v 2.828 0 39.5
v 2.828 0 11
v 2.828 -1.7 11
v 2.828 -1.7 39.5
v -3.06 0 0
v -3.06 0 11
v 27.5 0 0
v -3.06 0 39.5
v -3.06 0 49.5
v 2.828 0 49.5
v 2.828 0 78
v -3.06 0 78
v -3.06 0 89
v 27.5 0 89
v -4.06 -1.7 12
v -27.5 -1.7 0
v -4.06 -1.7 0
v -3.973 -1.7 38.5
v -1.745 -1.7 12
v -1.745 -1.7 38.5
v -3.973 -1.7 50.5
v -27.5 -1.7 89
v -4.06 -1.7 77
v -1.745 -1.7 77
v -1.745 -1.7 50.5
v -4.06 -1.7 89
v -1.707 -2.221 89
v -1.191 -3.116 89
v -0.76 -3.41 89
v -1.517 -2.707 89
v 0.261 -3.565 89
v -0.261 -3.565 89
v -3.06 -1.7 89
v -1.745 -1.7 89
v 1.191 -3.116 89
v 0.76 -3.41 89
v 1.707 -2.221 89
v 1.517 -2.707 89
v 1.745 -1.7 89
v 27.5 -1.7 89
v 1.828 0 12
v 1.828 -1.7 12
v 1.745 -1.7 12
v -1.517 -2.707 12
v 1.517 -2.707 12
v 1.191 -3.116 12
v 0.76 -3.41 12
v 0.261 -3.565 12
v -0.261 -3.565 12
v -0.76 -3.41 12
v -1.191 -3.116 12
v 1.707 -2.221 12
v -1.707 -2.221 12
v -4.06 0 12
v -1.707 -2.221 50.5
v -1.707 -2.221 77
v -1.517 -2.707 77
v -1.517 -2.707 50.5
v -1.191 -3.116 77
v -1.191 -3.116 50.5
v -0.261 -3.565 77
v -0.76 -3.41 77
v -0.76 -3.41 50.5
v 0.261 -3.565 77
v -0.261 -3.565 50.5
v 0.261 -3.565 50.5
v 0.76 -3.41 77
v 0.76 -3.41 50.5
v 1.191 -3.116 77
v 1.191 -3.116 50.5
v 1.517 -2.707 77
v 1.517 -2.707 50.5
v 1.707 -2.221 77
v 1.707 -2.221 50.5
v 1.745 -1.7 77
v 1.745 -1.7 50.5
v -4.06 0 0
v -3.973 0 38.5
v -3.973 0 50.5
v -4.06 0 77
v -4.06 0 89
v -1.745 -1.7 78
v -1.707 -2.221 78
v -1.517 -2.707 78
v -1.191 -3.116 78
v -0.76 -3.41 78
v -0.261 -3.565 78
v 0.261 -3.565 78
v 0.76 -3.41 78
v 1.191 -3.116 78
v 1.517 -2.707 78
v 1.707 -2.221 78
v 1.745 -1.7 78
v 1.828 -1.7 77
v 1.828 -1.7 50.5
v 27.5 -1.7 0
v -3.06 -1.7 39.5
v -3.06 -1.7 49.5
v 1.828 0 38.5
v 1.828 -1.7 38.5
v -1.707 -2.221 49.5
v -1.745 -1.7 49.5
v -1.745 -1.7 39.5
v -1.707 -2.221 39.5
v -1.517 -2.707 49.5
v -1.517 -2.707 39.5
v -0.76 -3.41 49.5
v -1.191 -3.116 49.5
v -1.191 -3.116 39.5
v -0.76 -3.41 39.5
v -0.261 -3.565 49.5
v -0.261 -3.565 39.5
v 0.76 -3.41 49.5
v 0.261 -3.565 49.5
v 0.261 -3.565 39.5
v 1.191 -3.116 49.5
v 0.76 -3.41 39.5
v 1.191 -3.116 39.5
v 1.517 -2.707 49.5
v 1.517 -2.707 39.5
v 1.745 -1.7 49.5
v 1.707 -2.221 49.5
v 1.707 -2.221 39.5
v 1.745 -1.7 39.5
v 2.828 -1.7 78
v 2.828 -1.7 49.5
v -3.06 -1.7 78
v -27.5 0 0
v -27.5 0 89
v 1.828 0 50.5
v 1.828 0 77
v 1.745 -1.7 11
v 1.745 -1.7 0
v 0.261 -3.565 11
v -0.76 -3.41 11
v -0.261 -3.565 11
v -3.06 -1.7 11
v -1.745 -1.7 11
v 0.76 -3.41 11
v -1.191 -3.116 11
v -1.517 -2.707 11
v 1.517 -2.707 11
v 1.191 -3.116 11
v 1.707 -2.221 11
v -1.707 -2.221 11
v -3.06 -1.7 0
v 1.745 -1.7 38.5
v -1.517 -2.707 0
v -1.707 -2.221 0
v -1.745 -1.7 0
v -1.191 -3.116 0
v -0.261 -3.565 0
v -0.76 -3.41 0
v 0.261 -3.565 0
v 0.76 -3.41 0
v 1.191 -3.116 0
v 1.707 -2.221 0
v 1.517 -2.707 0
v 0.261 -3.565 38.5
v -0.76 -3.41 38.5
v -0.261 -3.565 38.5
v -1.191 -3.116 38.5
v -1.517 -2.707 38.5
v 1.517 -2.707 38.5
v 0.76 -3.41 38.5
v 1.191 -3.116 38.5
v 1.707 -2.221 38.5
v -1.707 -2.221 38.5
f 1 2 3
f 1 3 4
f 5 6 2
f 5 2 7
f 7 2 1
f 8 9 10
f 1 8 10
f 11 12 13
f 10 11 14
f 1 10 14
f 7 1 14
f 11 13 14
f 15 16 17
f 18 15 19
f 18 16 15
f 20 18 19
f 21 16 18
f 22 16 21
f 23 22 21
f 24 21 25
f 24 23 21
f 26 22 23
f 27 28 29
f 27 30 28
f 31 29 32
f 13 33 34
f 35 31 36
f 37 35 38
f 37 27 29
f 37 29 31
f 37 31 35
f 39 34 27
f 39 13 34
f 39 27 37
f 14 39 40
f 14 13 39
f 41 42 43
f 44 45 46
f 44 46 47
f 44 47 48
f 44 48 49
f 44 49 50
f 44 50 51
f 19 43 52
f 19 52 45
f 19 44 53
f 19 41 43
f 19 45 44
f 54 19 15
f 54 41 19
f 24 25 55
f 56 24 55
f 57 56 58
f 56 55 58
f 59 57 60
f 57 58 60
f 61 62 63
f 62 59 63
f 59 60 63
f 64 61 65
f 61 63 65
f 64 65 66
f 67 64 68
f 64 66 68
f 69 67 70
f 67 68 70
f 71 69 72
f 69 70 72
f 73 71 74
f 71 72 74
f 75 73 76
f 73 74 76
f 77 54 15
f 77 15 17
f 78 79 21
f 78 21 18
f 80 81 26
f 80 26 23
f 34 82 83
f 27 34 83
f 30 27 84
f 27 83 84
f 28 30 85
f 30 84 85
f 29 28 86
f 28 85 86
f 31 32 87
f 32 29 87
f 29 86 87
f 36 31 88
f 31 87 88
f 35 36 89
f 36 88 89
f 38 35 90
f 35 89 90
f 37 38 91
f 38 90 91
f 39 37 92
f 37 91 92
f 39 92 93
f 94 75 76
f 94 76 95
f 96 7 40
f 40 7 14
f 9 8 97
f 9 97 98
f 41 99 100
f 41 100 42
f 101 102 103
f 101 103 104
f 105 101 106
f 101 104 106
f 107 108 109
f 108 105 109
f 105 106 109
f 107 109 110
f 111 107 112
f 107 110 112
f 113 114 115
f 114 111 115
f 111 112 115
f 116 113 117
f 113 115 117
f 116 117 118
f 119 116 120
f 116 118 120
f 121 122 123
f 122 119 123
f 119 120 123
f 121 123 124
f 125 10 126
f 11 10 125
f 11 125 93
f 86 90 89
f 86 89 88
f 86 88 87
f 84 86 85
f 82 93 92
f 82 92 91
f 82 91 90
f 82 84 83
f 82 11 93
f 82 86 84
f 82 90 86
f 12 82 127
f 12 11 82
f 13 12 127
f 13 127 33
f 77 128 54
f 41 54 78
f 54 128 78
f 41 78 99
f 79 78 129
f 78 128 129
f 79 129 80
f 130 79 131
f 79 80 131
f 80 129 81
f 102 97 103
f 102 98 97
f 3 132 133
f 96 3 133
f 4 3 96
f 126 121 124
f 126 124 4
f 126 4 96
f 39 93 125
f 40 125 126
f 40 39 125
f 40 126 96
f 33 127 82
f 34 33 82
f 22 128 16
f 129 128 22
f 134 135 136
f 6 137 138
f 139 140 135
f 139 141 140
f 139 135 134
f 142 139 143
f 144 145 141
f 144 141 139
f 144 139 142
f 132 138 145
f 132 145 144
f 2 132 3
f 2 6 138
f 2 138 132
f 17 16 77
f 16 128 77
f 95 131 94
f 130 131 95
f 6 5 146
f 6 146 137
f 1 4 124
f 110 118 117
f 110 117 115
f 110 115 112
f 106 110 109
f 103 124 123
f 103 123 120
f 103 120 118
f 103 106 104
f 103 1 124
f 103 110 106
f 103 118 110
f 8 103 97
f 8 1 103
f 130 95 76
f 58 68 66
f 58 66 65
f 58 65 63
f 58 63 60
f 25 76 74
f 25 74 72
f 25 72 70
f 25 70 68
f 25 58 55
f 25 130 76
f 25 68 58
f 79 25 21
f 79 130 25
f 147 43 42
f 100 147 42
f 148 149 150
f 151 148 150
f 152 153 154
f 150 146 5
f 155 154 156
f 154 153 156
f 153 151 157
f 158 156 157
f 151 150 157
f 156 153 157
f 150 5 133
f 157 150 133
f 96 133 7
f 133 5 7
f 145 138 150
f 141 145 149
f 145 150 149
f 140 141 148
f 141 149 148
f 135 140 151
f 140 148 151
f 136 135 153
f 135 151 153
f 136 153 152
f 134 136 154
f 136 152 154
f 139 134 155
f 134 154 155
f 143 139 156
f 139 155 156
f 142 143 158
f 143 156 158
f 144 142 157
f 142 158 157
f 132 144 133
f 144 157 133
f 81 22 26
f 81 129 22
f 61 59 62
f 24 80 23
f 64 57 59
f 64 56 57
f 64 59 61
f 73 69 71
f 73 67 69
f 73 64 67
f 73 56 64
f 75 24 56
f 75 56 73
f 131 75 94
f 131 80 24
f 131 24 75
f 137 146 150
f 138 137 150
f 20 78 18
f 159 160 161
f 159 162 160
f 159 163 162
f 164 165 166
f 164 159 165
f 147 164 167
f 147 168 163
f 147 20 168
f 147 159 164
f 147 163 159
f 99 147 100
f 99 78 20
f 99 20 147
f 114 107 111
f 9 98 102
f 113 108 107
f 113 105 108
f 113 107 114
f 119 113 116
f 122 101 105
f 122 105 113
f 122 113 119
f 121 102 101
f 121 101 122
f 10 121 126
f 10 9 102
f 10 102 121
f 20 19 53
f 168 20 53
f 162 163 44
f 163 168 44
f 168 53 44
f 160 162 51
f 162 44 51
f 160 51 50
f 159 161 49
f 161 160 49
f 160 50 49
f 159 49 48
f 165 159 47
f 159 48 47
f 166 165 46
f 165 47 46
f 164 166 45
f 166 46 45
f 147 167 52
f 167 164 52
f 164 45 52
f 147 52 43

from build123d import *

# Parameters (mm, degrees)
F0_W     = 55
F0_H     = 89
F1_DEPTH = 1.7
F2_R     = 1.75
F3_DEPTH = 89
F5_DEPTH = 3.585162


with BuildPart() as f1:
    # F0 (on Front) → F1 (new body)
    with BuildSketch(Plane.XZ):
        with Locations((0, 44.5)):
            Rectangle(F0_W, F0_H)
    extrude(amount=F1_DEPTH)

    # F2 (on Top) → F3 (join, through all)
    with BuildSketch(Plane.XY):
        with Locations((0, -1.834162)):
            Circle(F2_R)
    extrude(amount=F3_DEPTH)

    # F4 (on Front) → F5 (cut, through all)
    with BuildSketch(Plane.XZ):
        Polygon((-3.060026, 89), (-4.060026, 89), (-4.060026, 77), (1.827971, 77), (1.827971, 50.5), (-3.972793, 50.5), (-3.972793, 38.5), (1.827971, 38.5), (1.827971, 12), (-4.060026, 12), (-4.060026, 0), (-3.060026, 0), (-3.060026, 11), (2.827971, 11), (2.827971, 39.5), (-3.060026, 39.5), (-3.060026, 49.5), (2.827971, 49.5), (2.827971, 78), (-3.060026, 78), align=None)
    extrude(amount=F5_DEPTH, mode=Mode.SUBTRACT)


solid = f1.part
